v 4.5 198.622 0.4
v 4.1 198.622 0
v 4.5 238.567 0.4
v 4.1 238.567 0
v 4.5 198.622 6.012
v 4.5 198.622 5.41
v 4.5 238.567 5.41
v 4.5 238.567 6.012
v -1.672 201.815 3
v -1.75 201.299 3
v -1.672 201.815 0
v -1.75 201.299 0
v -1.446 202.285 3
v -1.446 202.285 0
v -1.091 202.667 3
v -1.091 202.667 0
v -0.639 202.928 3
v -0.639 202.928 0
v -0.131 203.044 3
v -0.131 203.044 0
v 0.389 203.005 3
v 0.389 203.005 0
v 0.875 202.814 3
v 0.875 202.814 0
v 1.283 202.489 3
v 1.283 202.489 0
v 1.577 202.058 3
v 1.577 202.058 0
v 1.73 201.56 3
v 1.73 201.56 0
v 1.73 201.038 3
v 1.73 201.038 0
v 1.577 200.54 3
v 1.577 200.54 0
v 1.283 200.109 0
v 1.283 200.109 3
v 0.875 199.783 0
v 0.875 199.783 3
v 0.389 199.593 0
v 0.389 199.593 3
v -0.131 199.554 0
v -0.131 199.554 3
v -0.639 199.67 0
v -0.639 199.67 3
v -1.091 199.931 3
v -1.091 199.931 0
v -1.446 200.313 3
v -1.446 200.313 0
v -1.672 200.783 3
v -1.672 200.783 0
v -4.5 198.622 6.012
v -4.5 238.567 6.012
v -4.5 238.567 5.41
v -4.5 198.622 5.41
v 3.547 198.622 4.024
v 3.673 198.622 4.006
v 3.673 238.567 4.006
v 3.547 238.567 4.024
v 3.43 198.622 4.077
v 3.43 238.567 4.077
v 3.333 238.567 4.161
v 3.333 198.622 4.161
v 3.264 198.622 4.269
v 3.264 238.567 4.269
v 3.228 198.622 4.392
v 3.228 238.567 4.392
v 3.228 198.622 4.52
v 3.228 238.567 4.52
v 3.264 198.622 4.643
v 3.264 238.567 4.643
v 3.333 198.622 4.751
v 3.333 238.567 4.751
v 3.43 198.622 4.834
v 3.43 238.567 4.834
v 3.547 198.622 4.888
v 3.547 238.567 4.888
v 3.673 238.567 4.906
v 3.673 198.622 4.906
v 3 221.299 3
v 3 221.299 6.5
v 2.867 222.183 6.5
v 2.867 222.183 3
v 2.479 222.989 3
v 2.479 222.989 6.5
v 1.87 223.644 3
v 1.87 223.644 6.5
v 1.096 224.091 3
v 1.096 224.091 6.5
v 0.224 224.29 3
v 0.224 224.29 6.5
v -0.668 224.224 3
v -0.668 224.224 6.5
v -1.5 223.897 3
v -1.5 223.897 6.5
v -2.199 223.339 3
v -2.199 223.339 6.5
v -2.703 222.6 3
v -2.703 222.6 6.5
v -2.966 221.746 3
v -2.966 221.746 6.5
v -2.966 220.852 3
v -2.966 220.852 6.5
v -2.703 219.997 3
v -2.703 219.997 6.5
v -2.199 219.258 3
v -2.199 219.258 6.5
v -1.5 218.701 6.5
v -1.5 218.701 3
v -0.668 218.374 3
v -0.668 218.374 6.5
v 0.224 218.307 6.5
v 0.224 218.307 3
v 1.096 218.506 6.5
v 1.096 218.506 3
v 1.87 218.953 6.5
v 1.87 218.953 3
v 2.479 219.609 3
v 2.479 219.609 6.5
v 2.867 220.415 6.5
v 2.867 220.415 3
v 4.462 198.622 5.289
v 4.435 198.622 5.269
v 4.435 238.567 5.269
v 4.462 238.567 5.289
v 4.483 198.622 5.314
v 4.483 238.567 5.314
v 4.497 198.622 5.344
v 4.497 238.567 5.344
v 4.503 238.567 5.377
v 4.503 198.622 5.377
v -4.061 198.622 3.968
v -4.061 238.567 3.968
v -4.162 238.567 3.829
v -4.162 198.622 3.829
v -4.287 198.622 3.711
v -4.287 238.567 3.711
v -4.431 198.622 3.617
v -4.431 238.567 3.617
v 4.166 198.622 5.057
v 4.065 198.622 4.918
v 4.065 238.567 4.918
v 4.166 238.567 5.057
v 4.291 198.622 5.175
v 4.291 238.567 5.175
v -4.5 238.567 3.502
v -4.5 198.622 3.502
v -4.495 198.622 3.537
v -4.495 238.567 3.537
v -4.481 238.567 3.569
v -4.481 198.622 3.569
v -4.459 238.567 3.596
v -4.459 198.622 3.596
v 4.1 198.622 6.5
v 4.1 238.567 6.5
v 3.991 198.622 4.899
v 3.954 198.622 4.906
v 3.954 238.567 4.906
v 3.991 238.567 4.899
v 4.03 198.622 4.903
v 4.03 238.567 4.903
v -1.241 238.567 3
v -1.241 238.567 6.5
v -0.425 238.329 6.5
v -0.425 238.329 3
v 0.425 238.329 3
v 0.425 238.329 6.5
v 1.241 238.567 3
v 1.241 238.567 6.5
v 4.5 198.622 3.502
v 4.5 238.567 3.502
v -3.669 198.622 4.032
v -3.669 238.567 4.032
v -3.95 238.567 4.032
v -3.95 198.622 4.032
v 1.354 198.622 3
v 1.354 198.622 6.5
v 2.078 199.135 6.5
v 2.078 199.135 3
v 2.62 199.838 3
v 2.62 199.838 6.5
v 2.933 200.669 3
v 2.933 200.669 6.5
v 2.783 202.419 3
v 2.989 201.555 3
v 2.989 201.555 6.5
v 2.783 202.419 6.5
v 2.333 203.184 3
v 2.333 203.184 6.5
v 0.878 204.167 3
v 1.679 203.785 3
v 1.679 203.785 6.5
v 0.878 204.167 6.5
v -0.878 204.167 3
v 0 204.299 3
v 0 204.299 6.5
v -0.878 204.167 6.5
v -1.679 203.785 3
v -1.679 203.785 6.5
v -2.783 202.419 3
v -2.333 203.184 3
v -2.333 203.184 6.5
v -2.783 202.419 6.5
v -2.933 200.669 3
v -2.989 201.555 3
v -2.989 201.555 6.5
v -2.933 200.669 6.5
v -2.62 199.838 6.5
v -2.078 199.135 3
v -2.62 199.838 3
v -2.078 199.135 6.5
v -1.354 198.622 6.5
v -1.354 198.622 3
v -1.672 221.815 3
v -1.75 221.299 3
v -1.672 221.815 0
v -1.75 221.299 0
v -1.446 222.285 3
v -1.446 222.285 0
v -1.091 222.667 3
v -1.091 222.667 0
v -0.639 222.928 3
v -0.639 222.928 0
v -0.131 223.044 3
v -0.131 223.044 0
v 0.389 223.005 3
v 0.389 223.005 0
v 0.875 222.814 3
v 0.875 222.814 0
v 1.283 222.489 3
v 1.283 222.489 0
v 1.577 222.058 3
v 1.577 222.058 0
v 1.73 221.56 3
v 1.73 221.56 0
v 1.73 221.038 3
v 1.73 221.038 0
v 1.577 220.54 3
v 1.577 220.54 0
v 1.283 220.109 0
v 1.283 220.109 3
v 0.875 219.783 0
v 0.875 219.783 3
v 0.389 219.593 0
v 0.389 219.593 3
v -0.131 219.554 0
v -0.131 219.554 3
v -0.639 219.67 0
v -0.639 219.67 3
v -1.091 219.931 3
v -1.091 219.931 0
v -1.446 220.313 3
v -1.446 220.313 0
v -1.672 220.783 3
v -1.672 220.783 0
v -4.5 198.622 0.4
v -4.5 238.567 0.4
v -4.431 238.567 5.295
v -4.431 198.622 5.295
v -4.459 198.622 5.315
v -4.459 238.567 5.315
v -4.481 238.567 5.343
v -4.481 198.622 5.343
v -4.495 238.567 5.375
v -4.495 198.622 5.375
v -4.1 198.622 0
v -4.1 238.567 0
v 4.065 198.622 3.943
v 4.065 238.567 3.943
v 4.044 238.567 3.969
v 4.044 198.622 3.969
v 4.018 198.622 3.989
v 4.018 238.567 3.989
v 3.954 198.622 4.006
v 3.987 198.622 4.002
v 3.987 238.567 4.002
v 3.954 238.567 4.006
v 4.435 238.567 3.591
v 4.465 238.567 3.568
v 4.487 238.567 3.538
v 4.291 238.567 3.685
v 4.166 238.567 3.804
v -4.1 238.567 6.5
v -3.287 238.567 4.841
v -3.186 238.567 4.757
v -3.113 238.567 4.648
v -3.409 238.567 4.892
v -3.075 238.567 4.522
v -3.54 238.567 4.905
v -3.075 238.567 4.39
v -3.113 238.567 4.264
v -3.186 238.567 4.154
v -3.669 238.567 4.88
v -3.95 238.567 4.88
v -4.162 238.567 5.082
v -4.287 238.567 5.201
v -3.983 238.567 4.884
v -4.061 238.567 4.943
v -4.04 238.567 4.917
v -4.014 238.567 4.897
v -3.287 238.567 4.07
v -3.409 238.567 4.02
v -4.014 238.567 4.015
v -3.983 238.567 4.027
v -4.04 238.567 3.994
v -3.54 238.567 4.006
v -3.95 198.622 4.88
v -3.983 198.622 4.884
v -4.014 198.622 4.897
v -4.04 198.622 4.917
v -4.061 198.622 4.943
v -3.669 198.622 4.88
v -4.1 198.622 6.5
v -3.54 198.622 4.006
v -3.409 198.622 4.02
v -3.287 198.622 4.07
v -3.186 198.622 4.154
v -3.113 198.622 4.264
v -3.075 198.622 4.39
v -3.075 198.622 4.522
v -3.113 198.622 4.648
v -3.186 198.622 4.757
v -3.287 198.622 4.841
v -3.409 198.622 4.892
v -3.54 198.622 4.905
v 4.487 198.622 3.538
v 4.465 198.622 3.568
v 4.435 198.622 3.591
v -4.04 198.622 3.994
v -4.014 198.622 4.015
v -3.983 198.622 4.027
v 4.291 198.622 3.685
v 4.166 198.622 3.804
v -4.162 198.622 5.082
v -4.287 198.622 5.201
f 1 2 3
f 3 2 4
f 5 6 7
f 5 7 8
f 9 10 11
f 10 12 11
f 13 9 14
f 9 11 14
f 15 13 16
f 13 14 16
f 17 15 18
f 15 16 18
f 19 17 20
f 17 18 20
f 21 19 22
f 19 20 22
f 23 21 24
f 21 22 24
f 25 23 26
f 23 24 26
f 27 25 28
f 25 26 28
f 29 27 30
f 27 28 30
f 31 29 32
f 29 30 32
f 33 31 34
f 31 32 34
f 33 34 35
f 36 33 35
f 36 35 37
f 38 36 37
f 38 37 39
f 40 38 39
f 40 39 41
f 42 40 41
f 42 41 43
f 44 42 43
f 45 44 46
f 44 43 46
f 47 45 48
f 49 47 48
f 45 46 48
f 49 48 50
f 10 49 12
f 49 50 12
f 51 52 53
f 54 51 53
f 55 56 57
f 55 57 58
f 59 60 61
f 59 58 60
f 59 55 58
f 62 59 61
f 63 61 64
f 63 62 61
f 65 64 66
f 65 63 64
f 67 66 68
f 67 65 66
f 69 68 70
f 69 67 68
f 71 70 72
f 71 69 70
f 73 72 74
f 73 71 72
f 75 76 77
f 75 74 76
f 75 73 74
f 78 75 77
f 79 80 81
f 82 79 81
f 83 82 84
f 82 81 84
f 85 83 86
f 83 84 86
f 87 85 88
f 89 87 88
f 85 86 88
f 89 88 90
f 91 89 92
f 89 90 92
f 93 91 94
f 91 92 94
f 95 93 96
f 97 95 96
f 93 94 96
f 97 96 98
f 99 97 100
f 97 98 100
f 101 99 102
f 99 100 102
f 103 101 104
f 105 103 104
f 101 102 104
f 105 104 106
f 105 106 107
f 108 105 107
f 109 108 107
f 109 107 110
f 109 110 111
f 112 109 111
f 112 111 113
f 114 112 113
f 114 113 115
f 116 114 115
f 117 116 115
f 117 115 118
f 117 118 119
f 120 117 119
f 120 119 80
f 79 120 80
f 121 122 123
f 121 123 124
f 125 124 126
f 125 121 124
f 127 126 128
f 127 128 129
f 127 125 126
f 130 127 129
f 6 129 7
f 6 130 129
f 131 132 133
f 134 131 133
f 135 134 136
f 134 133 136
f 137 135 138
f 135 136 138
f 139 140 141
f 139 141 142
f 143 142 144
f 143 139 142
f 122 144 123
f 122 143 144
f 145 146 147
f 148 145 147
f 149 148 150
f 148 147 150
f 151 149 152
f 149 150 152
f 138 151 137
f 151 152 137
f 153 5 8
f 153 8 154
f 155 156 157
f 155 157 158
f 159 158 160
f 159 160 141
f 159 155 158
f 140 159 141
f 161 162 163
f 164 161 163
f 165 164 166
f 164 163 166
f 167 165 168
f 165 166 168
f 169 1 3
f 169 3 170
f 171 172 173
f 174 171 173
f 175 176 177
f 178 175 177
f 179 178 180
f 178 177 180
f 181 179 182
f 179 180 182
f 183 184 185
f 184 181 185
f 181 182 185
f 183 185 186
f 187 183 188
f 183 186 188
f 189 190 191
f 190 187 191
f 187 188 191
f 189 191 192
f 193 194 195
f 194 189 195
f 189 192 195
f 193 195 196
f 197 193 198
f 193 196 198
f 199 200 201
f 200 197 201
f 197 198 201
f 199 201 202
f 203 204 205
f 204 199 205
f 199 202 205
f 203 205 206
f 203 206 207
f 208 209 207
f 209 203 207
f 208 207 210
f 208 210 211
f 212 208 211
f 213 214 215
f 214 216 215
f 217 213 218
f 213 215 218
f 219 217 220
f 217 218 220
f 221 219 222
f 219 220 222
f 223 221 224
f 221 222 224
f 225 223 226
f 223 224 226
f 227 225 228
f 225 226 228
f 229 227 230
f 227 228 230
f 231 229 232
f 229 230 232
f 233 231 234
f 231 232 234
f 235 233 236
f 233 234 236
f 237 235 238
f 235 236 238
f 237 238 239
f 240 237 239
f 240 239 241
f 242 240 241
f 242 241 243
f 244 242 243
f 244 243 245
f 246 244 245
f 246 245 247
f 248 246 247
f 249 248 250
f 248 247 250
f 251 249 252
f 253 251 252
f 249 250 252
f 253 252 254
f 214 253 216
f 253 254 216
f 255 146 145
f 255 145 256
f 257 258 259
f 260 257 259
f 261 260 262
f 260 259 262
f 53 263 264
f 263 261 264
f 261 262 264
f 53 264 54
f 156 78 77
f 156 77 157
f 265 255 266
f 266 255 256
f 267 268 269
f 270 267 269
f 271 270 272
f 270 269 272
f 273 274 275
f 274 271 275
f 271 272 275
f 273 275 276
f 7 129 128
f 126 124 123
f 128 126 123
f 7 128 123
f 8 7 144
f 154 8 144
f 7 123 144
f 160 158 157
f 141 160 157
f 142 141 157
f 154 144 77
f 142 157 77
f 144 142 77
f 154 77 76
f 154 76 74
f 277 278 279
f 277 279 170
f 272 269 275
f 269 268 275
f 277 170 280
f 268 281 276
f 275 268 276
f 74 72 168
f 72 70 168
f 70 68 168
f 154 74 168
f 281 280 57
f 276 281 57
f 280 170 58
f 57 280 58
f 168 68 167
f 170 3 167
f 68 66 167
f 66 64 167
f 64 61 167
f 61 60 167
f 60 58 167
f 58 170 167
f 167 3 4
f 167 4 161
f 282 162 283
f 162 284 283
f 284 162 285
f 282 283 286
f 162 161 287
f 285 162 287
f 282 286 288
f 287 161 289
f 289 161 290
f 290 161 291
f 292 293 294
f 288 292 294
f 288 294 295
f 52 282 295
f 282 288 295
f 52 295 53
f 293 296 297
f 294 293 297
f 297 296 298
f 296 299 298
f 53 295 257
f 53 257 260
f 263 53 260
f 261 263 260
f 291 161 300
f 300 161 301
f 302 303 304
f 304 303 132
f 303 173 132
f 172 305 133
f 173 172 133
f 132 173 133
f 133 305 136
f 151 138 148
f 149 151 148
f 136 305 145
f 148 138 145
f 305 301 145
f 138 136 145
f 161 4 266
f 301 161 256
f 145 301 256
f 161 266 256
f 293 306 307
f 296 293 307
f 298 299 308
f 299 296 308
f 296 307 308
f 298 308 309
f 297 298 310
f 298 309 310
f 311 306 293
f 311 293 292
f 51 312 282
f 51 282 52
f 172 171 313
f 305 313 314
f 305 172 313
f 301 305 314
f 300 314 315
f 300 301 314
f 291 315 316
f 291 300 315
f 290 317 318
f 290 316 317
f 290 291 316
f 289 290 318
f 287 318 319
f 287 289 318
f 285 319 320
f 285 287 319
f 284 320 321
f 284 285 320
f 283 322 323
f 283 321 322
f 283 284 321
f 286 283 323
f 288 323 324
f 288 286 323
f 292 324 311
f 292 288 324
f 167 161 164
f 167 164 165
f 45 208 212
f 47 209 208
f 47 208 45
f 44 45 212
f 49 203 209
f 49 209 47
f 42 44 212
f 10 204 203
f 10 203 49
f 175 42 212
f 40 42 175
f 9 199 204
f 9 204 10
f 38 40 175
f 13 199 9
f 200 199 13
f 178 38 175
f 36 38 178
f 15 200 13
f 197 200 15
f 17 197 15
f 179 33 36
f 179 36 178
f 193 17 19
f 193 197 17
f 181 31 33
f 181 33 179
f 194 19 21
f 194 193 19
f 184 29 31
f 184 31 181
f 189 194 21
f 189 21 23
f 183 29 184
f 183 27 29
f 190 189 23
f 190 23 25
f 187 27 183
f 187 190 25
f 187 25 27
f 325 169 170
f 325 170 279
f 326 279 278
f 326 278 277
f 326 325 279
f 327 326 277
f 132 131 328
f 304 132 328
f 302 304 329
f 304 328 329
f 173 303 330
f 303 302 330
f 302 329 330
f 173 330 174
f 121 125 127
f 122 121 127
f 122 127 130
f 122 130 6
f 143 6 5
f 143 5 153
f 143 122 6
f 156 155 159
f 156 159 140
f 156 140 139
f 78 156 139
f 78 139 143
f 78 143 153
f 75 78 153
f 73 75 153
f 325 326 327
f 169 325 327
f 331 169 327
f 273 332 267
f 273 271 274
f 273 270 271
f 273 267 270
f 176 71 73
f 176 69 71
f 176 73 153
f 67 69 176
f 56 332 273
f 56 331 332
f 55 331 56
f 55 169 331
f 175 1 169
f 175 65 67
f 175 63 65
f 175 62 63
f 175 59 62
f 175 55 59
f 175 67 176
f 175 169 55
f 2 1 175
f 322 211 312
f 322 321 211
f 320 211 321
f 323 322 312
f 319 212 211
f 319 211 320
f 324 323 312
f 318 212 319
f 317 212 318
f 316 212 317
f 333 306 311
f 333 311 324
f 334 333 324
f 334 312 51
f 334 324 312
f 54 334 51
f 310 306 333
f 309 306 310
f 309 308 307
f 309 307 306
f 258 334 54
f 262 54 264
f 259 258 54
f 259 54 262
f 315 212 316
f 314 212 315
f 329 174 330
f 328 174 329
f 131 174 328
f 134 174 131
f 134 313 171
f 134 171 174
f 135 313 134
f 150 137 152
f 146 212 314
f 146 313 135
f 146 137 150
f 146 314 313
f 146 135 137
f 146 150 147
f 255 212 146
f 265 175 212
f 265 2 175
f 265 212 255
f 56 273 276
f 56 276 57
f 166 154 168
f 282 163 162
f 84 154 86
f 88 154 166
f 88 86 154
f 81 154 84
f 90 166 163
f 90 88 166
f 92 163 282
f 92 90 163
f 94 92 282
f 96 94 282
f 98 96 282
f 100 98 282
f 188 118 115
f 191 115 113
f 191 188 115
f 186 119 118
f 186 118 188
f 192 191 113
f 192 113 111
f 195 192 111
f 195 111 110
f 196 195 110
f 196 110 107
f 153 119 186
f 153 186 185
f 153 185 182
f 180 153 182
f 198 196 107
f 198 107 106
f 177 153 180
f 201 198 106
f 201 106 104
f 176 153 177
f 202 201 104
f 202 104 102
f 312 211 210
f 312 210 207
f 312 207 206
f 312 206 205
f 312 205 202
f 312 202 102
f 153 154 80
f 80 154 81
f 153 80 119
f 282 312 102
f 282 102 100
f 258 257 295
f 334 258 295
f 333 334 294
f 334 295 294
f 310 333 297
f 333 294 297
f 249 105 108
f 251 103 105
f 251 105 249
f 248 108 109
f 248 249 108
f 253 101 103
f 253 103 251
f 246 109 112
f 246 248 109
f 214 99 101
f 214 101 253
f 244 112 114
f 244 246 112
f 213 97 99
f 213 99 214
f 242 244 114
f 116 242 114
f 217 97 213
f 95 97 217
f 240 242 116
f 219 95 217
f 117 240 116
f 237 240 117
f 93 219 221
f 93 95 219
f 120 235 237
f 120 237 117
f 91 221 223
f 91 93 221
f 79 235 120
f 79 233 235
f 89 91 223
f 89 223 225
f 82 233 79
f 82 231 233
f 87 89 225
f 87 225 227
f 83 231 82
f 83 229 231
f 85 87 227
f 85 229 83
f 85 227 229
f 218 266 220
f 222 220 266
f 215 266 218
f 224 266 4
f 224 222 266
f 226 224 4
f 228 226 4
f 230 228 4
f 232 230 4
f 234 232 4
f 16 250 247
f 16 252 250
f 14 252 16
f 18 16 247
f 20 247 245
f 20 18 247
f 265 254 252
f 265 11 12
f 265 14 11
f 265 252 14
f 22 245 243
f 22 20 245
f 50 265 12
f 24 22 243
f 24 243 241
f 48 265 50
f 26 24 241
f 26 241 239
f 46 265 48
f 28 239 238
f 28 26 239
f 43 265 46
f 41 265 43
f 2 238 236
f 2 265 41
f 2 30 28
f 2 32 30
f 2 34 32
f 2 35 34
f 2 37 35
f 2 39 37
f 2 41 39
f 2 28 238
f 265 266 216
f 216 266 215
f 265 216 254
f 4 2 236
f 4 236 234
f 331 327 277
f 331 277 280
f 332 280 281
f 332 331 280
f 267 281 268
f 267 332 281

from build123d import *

# Parameters (mm, degrees)
RESSALTO_EXTRUS_O1_DEPTH                             = 1000
CORTE_EXTRUS_O1_START                                = -1000
CORTE_EXTRUS_O1_DEPTH                                = 1000
CORTE_EXTRUS_O2_DEPTH                                = 1001.031261626
CORTE_EXTRUS_O3_DEPTH                                = 1001.031261626
CORTE_EXTRUS_O4_DEPTH                                = 1001.031261626
CORTE_EXTRUS_O5_DEPTH                                = 0.002166667
CORTE_EXTRUS_O6_DEPTH                                = 0.002166667
CORTE_EXTRUS_O7_DEPTH                                = 0.002166667
CORTE_EXTRUS_O8_DEPTH                                = 0.002166667
INCLINA_O1_ANGLE                                     = 45.1469538
ESBO_O10_W                                           = 0.450000001
ESBO_O10_H                                           = 1000
REBAIXO_PARA_PARAFUSO_DE_M_QUINA_DE_CABE_D           = 3.5
REBAIXO_PARA_PARAFUSO_DE_M_QUINA_DE_CABE_CBORE_D     = 6
REBAIXO_PARA_PARAFUSO_DE_M_QUINA_DE_CABE_CBORE_DEPTH = 3.50000002
CHANFRO1_SIZE                                        = 0.062563219
CHANFRO1_SIZE2                                       = 0.062205617
CHANFRO3_START                                       = -3.730761794
CHANFRO3_DEPTH                                       = 0.399013115
CHANFRO4_SIZE                                        = 0.4
FILETE1_R                                            = 0.130000023
SKETCH1_W                                            = 36.072768502
SKETCH1_H                                            = 771.589023544
SKETCH1_W_2                                          = 21.632087489
SKETCH1_H_2                                          = 231.614654652
CUT_EXTRUDE1_DEPTH                                   = 10


with BuildPart() as part:
    # Esboço1 → Ressalto-extrusão1 (new body)
    with BuildSketch(Plane.XZ):
        with BuildLine():
            Line((4.5, 5.4097155), (4.5, 6.01167813))
            Line((4.5, 6.01167813), (4.1, 6.50000002))
            Line((4.1, 6.50000002), (-4.1, 6.50000002))
            Line((-4.1, 6.50000002), (-4.5, 6.01167813))
            Line((-4.5, 6.01167813), (-4.5, 2e-08))
            Line((-4.5, 2e-08), (4.5, 2e-08))
            Line((4.5, 2e-08), (4.5, 3.50196265))
            ThreePointArc((4.5, 3.50196265), (4.477413879, 3.553810372), (4.43494978, 3.59116167))
            ThreePointArc((4.43494978, 3.59116167), (3.930462682, 4.43021964), (4.43494978, 5.26927761))
            ThreePointArc((4.43494978, 5.26927761), (4.490651601, 5.328761203), (4.5, 5.4097155))
        make_face()
    extrude(amount=-RESSALTO_EXTRUS_O1_DEPTH)

    # Esboço2 → Corte-extrusão1 (cut)
    with BuildSketch(Plane(origin=(0, 1000, 0), x_dir=(-1, 0, 0), z_dir=(0, 1, 0)).offset(CORTE_EXTRUS_O1_START)):
        with BuildLine():
            Line((-4.030498711, 4.00588336), (-3.673447948, 4.00588336))
            ThreePointArc((-3.673447948, 4.00588336), (-3.223447946, 4.455883362), (-3.673447948, 4.905883363))
            Line((-3.673447948, 4.905883363), (-3.953580008, 4.905883363))
            ThreePointArc((-3.953580008, 4.905883363), (-4.010719931, 4.899199784), (-4.065149208, 4.917830263))
            ThreePointArc((-4.065149208, 4.917830263), (-3.93114763, 4.466290066), (-4.030498711, 4.00588336))
        make_face()
    extrude(amount=CORTE_EXTRUS_O1_DEPTH, mode=Mode.SUBTRACT)

    # Esboço3 → Corte-extrusão2 (cut, through all)
    with BuildSketch(Plane(origin=(0, 1000, 0), x_dir=(-1, 0, 0), z_dir=(0, 1, 0))):
        with BuildLine():
            Line((4.5, 4.03150278), (4.5, 4.88017535))
            Line((4.5, 4.88017535), (3.66946318, 4.88017535))
            ThreePointArc((3.66946318, 4.88017535), (3.969667593, 4.455839065), (3.66946318, 4.03150278))
            Line((3.66946318, 4.03150278), (4.5, 4.03150278))
        make_face()
    extrude(amount=-CORTE_EXTRUS_O2_DEPTH, mode=Mode.SUBTRACT)

    # Esboço4 → Corte-extrusão3 (cut, through all)
    with BuildSketch(Plane(origin=(0, 1000, 0), x_dir=(-1, 0, 0), z_dir=(0, 1, 0))):
        with BuildLine():
            Line((4.026513974, 4.88017535), (4.5, 4.88017535))
            Line((4.5, 4.88017535), (4.5, 5.328056964))
            ThreePointArc((4.5, 5.328056964), (4.223646078, 5.145991535), (4.026513974, 4.88017535))
        make_face()
    extrude(amount=-CORTE_EXTRUS_O3_DEPTH, mode=Mode.SUBTRACT)

    # Esboço5 → Corte-extrusão4 (cut, through all)
    with BuildSketch(Plane(origin=(0, 1000, 0), x_dir=(-1, 0, 0), z_dir=(0, 1, 0))):
        with BuildLine():
            Line((4.5, 3.583620931), (4.5, 4.03150278))
            Line((4.5, 4.03150278), (4.026513856, 4.03150278))
            ThreePointArc((4.026513856, 4.03150278), (4.223645982, 3.76568645), (4.5, 3.583620931))
        make_face()
    extrude(amount=-CORTE_EXTRUS_O4_DEPTH, mode=Mode.SUBTRACT)

    # Esboço6 → Corte-extrusão5 (cut)
    with BuildSketch(Plane(origin=(0, 1000, 0), x_dir=(-1, 0, 0), z_dir=(0, 1, 0))):
        Polygon((0.891369267, 3.403698133), (0.714701433, 3.168235633), (0.2187042, 2.61105), (1.0945792, 2.61105), (1.0945792, 2.695983333), (0.398689633, 2.695983333), (0.794326433, 3.149466667), (0.9743123, 3.3891), (1.067110588, 3.573407857), (0.95413722, 3.802321701), (0.7876908, 3.88505), (0.54301, 3.88505), (0.375434678, 3.803592619), (0.295011167, 3.6384023), (0.295011167, 3.562), (0.3812718, 3.562), (0.3812718, 3.631766667), (0.437672733, 3.743620833), (0.549645633, 3.800116667), (0.7802262, 3.800116667), (0.893028067, 3.743810633), (0.976240026, 3.576039029), align=None)
    extrude(amount=-CORTE_EXTRUS_O5_DEPTH, mode=Mode.SUBTRACT)

    # Esboço7 → Corte-extrusão6 (cut)
    with BuildSketch(Plane.XZ):
        Polygon((-0.214632167, 3.88505), (-0.953983333, 3.88505), (-0.953983333, 2.61105), (-0.214632167, 2.61105), (-0.214632167, 2.695983333), (-0.86905, 2.695983333), (-0.86905, 3.205583333), (-0.5123963, 3.205583333), (-0.5123963, 3.290516667), (-0.86905, 3.290516667), (-0.86905, 3.800116667), (-0.214632167, 3.800116667), align=None)
    extrude(amount=-CORTE_EXTRUS_O6_DEPTH, mode=Mode.SUBTRACT)

    # Esboço8 → Corte-extrusão7 (cut)
    with BuildSketch(Plane(origin=(0, 1000, 0), x_dir=(-1, 0, 0), z_dir=(0, 1, 0))):
        Polygon((-0.214632167, 3.88505), (-0.953983333, 3.88505), (-0.953983333, 2.61105), (-0.214632167, 2.61105), (-0.214632167, 2.695983333), (-0.86905, 2.695983333), (-0.86905, 3.205583333), (-0.5123963, 3.205583333), (-0.5123963, 3.290516667), (-0.86905, 3.290516667), (-0.86905, 3.800116667), (-0.214632167, 3.800116667), align=None)
    extrude(amount=-CORTE_EXTRUS_O7_DEPTH, mode=Mode.SUBTRACT)

    # Esboço9 → Corte-extrusão8 (cut)
    with BuildSketch(Plane.XZ):
        Polygon((0.510057167, 3.620830633), (0.6071, 3.718655633), (0.6071, 2.609403333), (0.692033333, 2.609403333), (0.692033333, 3.883403333), (0.6741176, 3.883403333), (0.6741176, 3.795069794), (0.3690544, 3.640736667), (0.3690544, 3.551253333), align=None)
    extrude(amount=-CORTE_EXTRUS_O8_DEPTH, mode=Mode.SUBTRACT)

    # Inclinação1
    inclina_o1_faces = [part.faces().sort_by_distance(p)[0] for p in [
        (0.6741176, 0.001083333, 3.839236564),
    ]]
    draft(inclina_o1_faces, Plane(origin=(0.692033333, 0.002166667, 3.883403333), x_dir=(-1, 0, 0), z_dir=(0, 0, -1)), INCLINA_O1_ANGLE)

    # Esboço10 → Corte-Revolução1 (revolve, cut)
    with BuildSketch(Plane.XY.offset(4.455839065)):
        with Locations((-3.294667591, 500)):
            Rectangle(ESBO_O10_W, ESBO_O10_H)
    revolve(axis=Axis((-3.519667591, 1000, 4.455839065), (0, -1, 0)), mode=Mode.SUBTRACT)

    # Rebaixo para parafuso de máquina de cabeça sextavada de M31 (through all)
    with Locations(Plane.XY.offset(6.50000002)):
        with Locations((0, 221.298822188), (0, 201.298822188), (0, 241.298822188), (0, 261.298822188)):
            CounterBoreHole(REBAIXO_PARA_PARAFUSO_DE_M_QUINA_DE_CABE_D / 2, REBAIXO_PARA_PARAFUSO_DE_M_QUINA_DE_CABE_CBORE_D / 2, REBAIXO_PARA_PARAFUSO_DE_M_QUINA_DE_CABE_CBORE_DEPTH)

    # Chanfro1
    chanfro1_edges = [part.edges().sort_by_distance(p)[0] for p in [
        (-0.976240026, 999.998916667, 3.576039029),
    ]]
    chanfro1_side = [part.faces().sort_by_distance(p)[0] for p in [
        (-0.933804646, 999.998916667, 3.489868581),
    ]]
    chamfer(chanfro1_edges, length=CHANFRO1_SIZE, length2=CHANFRO1_SIZE2, reference=chanfro1_side[0])

    # Chanfro3: read off the stored shape, not the designer's step
    # Chanfro3 outline → Chanfro3 (add)
    with BuildSketch(Plane(origin=(0, 0, 0), x_dir=(0.8991051825477068, 0, 0.43773264753254887), z_dir=(0.4377326475325489, 0, -0.8991051825477069)).offset(CHANFRO3_START)):
        Polygon((1.327401403, -999.997833333), (1.31122788, -999.997833333), (1.311999664, -1000), (1.327401403, -1000), align=None)
    extrude(amount=CHANFRO3_DEPTH)

    # Chanfro4
    chanfro4_edges = [part.edges().sort_by_distance(p)[0] for p in [
        (4.5, 500, 2e-08),
        (-4.5, 500, 2e-08),
    ]]
    chamfer(chanfro4_edges, length=CHANFRO4_SIZE)

    # Filete1
    filete1_edges = [part.edges().sort_by_distance(p)[0] for p in [
        (4.030498711, 500, 4.00588336),
        (-4.026513974, 500, 4.88017535),
        (-4.5, 500, 5.328056964),
        (-4.5, 500, 3.583620931),
        (-4.026513856, 500, 4.03150278),
    ]]
    fillet(filete1_edges, radius=FILETE1_R)

    # Sketch1 → Cut-Extrude1 (cut)
    with BuildSketch(Plane(origin=(0, 0, 0), x_dir=(-1, 0, 0), z_dir=(0, 0, -1))):
        with Locations((-9.39117436, 624.361983818)):
            Rectangle(SKETCH1_W, SKETCH1_H)
        with Locations((0.25600221, 82.81425767)):
            Rectangle(SKETCH1_W_2, SKETCH1_H_2)
    extrude(amount=-CUT_EXTRUDE1_DEPTH, mode=Mode.SUBTRACT)


solid = part.part
